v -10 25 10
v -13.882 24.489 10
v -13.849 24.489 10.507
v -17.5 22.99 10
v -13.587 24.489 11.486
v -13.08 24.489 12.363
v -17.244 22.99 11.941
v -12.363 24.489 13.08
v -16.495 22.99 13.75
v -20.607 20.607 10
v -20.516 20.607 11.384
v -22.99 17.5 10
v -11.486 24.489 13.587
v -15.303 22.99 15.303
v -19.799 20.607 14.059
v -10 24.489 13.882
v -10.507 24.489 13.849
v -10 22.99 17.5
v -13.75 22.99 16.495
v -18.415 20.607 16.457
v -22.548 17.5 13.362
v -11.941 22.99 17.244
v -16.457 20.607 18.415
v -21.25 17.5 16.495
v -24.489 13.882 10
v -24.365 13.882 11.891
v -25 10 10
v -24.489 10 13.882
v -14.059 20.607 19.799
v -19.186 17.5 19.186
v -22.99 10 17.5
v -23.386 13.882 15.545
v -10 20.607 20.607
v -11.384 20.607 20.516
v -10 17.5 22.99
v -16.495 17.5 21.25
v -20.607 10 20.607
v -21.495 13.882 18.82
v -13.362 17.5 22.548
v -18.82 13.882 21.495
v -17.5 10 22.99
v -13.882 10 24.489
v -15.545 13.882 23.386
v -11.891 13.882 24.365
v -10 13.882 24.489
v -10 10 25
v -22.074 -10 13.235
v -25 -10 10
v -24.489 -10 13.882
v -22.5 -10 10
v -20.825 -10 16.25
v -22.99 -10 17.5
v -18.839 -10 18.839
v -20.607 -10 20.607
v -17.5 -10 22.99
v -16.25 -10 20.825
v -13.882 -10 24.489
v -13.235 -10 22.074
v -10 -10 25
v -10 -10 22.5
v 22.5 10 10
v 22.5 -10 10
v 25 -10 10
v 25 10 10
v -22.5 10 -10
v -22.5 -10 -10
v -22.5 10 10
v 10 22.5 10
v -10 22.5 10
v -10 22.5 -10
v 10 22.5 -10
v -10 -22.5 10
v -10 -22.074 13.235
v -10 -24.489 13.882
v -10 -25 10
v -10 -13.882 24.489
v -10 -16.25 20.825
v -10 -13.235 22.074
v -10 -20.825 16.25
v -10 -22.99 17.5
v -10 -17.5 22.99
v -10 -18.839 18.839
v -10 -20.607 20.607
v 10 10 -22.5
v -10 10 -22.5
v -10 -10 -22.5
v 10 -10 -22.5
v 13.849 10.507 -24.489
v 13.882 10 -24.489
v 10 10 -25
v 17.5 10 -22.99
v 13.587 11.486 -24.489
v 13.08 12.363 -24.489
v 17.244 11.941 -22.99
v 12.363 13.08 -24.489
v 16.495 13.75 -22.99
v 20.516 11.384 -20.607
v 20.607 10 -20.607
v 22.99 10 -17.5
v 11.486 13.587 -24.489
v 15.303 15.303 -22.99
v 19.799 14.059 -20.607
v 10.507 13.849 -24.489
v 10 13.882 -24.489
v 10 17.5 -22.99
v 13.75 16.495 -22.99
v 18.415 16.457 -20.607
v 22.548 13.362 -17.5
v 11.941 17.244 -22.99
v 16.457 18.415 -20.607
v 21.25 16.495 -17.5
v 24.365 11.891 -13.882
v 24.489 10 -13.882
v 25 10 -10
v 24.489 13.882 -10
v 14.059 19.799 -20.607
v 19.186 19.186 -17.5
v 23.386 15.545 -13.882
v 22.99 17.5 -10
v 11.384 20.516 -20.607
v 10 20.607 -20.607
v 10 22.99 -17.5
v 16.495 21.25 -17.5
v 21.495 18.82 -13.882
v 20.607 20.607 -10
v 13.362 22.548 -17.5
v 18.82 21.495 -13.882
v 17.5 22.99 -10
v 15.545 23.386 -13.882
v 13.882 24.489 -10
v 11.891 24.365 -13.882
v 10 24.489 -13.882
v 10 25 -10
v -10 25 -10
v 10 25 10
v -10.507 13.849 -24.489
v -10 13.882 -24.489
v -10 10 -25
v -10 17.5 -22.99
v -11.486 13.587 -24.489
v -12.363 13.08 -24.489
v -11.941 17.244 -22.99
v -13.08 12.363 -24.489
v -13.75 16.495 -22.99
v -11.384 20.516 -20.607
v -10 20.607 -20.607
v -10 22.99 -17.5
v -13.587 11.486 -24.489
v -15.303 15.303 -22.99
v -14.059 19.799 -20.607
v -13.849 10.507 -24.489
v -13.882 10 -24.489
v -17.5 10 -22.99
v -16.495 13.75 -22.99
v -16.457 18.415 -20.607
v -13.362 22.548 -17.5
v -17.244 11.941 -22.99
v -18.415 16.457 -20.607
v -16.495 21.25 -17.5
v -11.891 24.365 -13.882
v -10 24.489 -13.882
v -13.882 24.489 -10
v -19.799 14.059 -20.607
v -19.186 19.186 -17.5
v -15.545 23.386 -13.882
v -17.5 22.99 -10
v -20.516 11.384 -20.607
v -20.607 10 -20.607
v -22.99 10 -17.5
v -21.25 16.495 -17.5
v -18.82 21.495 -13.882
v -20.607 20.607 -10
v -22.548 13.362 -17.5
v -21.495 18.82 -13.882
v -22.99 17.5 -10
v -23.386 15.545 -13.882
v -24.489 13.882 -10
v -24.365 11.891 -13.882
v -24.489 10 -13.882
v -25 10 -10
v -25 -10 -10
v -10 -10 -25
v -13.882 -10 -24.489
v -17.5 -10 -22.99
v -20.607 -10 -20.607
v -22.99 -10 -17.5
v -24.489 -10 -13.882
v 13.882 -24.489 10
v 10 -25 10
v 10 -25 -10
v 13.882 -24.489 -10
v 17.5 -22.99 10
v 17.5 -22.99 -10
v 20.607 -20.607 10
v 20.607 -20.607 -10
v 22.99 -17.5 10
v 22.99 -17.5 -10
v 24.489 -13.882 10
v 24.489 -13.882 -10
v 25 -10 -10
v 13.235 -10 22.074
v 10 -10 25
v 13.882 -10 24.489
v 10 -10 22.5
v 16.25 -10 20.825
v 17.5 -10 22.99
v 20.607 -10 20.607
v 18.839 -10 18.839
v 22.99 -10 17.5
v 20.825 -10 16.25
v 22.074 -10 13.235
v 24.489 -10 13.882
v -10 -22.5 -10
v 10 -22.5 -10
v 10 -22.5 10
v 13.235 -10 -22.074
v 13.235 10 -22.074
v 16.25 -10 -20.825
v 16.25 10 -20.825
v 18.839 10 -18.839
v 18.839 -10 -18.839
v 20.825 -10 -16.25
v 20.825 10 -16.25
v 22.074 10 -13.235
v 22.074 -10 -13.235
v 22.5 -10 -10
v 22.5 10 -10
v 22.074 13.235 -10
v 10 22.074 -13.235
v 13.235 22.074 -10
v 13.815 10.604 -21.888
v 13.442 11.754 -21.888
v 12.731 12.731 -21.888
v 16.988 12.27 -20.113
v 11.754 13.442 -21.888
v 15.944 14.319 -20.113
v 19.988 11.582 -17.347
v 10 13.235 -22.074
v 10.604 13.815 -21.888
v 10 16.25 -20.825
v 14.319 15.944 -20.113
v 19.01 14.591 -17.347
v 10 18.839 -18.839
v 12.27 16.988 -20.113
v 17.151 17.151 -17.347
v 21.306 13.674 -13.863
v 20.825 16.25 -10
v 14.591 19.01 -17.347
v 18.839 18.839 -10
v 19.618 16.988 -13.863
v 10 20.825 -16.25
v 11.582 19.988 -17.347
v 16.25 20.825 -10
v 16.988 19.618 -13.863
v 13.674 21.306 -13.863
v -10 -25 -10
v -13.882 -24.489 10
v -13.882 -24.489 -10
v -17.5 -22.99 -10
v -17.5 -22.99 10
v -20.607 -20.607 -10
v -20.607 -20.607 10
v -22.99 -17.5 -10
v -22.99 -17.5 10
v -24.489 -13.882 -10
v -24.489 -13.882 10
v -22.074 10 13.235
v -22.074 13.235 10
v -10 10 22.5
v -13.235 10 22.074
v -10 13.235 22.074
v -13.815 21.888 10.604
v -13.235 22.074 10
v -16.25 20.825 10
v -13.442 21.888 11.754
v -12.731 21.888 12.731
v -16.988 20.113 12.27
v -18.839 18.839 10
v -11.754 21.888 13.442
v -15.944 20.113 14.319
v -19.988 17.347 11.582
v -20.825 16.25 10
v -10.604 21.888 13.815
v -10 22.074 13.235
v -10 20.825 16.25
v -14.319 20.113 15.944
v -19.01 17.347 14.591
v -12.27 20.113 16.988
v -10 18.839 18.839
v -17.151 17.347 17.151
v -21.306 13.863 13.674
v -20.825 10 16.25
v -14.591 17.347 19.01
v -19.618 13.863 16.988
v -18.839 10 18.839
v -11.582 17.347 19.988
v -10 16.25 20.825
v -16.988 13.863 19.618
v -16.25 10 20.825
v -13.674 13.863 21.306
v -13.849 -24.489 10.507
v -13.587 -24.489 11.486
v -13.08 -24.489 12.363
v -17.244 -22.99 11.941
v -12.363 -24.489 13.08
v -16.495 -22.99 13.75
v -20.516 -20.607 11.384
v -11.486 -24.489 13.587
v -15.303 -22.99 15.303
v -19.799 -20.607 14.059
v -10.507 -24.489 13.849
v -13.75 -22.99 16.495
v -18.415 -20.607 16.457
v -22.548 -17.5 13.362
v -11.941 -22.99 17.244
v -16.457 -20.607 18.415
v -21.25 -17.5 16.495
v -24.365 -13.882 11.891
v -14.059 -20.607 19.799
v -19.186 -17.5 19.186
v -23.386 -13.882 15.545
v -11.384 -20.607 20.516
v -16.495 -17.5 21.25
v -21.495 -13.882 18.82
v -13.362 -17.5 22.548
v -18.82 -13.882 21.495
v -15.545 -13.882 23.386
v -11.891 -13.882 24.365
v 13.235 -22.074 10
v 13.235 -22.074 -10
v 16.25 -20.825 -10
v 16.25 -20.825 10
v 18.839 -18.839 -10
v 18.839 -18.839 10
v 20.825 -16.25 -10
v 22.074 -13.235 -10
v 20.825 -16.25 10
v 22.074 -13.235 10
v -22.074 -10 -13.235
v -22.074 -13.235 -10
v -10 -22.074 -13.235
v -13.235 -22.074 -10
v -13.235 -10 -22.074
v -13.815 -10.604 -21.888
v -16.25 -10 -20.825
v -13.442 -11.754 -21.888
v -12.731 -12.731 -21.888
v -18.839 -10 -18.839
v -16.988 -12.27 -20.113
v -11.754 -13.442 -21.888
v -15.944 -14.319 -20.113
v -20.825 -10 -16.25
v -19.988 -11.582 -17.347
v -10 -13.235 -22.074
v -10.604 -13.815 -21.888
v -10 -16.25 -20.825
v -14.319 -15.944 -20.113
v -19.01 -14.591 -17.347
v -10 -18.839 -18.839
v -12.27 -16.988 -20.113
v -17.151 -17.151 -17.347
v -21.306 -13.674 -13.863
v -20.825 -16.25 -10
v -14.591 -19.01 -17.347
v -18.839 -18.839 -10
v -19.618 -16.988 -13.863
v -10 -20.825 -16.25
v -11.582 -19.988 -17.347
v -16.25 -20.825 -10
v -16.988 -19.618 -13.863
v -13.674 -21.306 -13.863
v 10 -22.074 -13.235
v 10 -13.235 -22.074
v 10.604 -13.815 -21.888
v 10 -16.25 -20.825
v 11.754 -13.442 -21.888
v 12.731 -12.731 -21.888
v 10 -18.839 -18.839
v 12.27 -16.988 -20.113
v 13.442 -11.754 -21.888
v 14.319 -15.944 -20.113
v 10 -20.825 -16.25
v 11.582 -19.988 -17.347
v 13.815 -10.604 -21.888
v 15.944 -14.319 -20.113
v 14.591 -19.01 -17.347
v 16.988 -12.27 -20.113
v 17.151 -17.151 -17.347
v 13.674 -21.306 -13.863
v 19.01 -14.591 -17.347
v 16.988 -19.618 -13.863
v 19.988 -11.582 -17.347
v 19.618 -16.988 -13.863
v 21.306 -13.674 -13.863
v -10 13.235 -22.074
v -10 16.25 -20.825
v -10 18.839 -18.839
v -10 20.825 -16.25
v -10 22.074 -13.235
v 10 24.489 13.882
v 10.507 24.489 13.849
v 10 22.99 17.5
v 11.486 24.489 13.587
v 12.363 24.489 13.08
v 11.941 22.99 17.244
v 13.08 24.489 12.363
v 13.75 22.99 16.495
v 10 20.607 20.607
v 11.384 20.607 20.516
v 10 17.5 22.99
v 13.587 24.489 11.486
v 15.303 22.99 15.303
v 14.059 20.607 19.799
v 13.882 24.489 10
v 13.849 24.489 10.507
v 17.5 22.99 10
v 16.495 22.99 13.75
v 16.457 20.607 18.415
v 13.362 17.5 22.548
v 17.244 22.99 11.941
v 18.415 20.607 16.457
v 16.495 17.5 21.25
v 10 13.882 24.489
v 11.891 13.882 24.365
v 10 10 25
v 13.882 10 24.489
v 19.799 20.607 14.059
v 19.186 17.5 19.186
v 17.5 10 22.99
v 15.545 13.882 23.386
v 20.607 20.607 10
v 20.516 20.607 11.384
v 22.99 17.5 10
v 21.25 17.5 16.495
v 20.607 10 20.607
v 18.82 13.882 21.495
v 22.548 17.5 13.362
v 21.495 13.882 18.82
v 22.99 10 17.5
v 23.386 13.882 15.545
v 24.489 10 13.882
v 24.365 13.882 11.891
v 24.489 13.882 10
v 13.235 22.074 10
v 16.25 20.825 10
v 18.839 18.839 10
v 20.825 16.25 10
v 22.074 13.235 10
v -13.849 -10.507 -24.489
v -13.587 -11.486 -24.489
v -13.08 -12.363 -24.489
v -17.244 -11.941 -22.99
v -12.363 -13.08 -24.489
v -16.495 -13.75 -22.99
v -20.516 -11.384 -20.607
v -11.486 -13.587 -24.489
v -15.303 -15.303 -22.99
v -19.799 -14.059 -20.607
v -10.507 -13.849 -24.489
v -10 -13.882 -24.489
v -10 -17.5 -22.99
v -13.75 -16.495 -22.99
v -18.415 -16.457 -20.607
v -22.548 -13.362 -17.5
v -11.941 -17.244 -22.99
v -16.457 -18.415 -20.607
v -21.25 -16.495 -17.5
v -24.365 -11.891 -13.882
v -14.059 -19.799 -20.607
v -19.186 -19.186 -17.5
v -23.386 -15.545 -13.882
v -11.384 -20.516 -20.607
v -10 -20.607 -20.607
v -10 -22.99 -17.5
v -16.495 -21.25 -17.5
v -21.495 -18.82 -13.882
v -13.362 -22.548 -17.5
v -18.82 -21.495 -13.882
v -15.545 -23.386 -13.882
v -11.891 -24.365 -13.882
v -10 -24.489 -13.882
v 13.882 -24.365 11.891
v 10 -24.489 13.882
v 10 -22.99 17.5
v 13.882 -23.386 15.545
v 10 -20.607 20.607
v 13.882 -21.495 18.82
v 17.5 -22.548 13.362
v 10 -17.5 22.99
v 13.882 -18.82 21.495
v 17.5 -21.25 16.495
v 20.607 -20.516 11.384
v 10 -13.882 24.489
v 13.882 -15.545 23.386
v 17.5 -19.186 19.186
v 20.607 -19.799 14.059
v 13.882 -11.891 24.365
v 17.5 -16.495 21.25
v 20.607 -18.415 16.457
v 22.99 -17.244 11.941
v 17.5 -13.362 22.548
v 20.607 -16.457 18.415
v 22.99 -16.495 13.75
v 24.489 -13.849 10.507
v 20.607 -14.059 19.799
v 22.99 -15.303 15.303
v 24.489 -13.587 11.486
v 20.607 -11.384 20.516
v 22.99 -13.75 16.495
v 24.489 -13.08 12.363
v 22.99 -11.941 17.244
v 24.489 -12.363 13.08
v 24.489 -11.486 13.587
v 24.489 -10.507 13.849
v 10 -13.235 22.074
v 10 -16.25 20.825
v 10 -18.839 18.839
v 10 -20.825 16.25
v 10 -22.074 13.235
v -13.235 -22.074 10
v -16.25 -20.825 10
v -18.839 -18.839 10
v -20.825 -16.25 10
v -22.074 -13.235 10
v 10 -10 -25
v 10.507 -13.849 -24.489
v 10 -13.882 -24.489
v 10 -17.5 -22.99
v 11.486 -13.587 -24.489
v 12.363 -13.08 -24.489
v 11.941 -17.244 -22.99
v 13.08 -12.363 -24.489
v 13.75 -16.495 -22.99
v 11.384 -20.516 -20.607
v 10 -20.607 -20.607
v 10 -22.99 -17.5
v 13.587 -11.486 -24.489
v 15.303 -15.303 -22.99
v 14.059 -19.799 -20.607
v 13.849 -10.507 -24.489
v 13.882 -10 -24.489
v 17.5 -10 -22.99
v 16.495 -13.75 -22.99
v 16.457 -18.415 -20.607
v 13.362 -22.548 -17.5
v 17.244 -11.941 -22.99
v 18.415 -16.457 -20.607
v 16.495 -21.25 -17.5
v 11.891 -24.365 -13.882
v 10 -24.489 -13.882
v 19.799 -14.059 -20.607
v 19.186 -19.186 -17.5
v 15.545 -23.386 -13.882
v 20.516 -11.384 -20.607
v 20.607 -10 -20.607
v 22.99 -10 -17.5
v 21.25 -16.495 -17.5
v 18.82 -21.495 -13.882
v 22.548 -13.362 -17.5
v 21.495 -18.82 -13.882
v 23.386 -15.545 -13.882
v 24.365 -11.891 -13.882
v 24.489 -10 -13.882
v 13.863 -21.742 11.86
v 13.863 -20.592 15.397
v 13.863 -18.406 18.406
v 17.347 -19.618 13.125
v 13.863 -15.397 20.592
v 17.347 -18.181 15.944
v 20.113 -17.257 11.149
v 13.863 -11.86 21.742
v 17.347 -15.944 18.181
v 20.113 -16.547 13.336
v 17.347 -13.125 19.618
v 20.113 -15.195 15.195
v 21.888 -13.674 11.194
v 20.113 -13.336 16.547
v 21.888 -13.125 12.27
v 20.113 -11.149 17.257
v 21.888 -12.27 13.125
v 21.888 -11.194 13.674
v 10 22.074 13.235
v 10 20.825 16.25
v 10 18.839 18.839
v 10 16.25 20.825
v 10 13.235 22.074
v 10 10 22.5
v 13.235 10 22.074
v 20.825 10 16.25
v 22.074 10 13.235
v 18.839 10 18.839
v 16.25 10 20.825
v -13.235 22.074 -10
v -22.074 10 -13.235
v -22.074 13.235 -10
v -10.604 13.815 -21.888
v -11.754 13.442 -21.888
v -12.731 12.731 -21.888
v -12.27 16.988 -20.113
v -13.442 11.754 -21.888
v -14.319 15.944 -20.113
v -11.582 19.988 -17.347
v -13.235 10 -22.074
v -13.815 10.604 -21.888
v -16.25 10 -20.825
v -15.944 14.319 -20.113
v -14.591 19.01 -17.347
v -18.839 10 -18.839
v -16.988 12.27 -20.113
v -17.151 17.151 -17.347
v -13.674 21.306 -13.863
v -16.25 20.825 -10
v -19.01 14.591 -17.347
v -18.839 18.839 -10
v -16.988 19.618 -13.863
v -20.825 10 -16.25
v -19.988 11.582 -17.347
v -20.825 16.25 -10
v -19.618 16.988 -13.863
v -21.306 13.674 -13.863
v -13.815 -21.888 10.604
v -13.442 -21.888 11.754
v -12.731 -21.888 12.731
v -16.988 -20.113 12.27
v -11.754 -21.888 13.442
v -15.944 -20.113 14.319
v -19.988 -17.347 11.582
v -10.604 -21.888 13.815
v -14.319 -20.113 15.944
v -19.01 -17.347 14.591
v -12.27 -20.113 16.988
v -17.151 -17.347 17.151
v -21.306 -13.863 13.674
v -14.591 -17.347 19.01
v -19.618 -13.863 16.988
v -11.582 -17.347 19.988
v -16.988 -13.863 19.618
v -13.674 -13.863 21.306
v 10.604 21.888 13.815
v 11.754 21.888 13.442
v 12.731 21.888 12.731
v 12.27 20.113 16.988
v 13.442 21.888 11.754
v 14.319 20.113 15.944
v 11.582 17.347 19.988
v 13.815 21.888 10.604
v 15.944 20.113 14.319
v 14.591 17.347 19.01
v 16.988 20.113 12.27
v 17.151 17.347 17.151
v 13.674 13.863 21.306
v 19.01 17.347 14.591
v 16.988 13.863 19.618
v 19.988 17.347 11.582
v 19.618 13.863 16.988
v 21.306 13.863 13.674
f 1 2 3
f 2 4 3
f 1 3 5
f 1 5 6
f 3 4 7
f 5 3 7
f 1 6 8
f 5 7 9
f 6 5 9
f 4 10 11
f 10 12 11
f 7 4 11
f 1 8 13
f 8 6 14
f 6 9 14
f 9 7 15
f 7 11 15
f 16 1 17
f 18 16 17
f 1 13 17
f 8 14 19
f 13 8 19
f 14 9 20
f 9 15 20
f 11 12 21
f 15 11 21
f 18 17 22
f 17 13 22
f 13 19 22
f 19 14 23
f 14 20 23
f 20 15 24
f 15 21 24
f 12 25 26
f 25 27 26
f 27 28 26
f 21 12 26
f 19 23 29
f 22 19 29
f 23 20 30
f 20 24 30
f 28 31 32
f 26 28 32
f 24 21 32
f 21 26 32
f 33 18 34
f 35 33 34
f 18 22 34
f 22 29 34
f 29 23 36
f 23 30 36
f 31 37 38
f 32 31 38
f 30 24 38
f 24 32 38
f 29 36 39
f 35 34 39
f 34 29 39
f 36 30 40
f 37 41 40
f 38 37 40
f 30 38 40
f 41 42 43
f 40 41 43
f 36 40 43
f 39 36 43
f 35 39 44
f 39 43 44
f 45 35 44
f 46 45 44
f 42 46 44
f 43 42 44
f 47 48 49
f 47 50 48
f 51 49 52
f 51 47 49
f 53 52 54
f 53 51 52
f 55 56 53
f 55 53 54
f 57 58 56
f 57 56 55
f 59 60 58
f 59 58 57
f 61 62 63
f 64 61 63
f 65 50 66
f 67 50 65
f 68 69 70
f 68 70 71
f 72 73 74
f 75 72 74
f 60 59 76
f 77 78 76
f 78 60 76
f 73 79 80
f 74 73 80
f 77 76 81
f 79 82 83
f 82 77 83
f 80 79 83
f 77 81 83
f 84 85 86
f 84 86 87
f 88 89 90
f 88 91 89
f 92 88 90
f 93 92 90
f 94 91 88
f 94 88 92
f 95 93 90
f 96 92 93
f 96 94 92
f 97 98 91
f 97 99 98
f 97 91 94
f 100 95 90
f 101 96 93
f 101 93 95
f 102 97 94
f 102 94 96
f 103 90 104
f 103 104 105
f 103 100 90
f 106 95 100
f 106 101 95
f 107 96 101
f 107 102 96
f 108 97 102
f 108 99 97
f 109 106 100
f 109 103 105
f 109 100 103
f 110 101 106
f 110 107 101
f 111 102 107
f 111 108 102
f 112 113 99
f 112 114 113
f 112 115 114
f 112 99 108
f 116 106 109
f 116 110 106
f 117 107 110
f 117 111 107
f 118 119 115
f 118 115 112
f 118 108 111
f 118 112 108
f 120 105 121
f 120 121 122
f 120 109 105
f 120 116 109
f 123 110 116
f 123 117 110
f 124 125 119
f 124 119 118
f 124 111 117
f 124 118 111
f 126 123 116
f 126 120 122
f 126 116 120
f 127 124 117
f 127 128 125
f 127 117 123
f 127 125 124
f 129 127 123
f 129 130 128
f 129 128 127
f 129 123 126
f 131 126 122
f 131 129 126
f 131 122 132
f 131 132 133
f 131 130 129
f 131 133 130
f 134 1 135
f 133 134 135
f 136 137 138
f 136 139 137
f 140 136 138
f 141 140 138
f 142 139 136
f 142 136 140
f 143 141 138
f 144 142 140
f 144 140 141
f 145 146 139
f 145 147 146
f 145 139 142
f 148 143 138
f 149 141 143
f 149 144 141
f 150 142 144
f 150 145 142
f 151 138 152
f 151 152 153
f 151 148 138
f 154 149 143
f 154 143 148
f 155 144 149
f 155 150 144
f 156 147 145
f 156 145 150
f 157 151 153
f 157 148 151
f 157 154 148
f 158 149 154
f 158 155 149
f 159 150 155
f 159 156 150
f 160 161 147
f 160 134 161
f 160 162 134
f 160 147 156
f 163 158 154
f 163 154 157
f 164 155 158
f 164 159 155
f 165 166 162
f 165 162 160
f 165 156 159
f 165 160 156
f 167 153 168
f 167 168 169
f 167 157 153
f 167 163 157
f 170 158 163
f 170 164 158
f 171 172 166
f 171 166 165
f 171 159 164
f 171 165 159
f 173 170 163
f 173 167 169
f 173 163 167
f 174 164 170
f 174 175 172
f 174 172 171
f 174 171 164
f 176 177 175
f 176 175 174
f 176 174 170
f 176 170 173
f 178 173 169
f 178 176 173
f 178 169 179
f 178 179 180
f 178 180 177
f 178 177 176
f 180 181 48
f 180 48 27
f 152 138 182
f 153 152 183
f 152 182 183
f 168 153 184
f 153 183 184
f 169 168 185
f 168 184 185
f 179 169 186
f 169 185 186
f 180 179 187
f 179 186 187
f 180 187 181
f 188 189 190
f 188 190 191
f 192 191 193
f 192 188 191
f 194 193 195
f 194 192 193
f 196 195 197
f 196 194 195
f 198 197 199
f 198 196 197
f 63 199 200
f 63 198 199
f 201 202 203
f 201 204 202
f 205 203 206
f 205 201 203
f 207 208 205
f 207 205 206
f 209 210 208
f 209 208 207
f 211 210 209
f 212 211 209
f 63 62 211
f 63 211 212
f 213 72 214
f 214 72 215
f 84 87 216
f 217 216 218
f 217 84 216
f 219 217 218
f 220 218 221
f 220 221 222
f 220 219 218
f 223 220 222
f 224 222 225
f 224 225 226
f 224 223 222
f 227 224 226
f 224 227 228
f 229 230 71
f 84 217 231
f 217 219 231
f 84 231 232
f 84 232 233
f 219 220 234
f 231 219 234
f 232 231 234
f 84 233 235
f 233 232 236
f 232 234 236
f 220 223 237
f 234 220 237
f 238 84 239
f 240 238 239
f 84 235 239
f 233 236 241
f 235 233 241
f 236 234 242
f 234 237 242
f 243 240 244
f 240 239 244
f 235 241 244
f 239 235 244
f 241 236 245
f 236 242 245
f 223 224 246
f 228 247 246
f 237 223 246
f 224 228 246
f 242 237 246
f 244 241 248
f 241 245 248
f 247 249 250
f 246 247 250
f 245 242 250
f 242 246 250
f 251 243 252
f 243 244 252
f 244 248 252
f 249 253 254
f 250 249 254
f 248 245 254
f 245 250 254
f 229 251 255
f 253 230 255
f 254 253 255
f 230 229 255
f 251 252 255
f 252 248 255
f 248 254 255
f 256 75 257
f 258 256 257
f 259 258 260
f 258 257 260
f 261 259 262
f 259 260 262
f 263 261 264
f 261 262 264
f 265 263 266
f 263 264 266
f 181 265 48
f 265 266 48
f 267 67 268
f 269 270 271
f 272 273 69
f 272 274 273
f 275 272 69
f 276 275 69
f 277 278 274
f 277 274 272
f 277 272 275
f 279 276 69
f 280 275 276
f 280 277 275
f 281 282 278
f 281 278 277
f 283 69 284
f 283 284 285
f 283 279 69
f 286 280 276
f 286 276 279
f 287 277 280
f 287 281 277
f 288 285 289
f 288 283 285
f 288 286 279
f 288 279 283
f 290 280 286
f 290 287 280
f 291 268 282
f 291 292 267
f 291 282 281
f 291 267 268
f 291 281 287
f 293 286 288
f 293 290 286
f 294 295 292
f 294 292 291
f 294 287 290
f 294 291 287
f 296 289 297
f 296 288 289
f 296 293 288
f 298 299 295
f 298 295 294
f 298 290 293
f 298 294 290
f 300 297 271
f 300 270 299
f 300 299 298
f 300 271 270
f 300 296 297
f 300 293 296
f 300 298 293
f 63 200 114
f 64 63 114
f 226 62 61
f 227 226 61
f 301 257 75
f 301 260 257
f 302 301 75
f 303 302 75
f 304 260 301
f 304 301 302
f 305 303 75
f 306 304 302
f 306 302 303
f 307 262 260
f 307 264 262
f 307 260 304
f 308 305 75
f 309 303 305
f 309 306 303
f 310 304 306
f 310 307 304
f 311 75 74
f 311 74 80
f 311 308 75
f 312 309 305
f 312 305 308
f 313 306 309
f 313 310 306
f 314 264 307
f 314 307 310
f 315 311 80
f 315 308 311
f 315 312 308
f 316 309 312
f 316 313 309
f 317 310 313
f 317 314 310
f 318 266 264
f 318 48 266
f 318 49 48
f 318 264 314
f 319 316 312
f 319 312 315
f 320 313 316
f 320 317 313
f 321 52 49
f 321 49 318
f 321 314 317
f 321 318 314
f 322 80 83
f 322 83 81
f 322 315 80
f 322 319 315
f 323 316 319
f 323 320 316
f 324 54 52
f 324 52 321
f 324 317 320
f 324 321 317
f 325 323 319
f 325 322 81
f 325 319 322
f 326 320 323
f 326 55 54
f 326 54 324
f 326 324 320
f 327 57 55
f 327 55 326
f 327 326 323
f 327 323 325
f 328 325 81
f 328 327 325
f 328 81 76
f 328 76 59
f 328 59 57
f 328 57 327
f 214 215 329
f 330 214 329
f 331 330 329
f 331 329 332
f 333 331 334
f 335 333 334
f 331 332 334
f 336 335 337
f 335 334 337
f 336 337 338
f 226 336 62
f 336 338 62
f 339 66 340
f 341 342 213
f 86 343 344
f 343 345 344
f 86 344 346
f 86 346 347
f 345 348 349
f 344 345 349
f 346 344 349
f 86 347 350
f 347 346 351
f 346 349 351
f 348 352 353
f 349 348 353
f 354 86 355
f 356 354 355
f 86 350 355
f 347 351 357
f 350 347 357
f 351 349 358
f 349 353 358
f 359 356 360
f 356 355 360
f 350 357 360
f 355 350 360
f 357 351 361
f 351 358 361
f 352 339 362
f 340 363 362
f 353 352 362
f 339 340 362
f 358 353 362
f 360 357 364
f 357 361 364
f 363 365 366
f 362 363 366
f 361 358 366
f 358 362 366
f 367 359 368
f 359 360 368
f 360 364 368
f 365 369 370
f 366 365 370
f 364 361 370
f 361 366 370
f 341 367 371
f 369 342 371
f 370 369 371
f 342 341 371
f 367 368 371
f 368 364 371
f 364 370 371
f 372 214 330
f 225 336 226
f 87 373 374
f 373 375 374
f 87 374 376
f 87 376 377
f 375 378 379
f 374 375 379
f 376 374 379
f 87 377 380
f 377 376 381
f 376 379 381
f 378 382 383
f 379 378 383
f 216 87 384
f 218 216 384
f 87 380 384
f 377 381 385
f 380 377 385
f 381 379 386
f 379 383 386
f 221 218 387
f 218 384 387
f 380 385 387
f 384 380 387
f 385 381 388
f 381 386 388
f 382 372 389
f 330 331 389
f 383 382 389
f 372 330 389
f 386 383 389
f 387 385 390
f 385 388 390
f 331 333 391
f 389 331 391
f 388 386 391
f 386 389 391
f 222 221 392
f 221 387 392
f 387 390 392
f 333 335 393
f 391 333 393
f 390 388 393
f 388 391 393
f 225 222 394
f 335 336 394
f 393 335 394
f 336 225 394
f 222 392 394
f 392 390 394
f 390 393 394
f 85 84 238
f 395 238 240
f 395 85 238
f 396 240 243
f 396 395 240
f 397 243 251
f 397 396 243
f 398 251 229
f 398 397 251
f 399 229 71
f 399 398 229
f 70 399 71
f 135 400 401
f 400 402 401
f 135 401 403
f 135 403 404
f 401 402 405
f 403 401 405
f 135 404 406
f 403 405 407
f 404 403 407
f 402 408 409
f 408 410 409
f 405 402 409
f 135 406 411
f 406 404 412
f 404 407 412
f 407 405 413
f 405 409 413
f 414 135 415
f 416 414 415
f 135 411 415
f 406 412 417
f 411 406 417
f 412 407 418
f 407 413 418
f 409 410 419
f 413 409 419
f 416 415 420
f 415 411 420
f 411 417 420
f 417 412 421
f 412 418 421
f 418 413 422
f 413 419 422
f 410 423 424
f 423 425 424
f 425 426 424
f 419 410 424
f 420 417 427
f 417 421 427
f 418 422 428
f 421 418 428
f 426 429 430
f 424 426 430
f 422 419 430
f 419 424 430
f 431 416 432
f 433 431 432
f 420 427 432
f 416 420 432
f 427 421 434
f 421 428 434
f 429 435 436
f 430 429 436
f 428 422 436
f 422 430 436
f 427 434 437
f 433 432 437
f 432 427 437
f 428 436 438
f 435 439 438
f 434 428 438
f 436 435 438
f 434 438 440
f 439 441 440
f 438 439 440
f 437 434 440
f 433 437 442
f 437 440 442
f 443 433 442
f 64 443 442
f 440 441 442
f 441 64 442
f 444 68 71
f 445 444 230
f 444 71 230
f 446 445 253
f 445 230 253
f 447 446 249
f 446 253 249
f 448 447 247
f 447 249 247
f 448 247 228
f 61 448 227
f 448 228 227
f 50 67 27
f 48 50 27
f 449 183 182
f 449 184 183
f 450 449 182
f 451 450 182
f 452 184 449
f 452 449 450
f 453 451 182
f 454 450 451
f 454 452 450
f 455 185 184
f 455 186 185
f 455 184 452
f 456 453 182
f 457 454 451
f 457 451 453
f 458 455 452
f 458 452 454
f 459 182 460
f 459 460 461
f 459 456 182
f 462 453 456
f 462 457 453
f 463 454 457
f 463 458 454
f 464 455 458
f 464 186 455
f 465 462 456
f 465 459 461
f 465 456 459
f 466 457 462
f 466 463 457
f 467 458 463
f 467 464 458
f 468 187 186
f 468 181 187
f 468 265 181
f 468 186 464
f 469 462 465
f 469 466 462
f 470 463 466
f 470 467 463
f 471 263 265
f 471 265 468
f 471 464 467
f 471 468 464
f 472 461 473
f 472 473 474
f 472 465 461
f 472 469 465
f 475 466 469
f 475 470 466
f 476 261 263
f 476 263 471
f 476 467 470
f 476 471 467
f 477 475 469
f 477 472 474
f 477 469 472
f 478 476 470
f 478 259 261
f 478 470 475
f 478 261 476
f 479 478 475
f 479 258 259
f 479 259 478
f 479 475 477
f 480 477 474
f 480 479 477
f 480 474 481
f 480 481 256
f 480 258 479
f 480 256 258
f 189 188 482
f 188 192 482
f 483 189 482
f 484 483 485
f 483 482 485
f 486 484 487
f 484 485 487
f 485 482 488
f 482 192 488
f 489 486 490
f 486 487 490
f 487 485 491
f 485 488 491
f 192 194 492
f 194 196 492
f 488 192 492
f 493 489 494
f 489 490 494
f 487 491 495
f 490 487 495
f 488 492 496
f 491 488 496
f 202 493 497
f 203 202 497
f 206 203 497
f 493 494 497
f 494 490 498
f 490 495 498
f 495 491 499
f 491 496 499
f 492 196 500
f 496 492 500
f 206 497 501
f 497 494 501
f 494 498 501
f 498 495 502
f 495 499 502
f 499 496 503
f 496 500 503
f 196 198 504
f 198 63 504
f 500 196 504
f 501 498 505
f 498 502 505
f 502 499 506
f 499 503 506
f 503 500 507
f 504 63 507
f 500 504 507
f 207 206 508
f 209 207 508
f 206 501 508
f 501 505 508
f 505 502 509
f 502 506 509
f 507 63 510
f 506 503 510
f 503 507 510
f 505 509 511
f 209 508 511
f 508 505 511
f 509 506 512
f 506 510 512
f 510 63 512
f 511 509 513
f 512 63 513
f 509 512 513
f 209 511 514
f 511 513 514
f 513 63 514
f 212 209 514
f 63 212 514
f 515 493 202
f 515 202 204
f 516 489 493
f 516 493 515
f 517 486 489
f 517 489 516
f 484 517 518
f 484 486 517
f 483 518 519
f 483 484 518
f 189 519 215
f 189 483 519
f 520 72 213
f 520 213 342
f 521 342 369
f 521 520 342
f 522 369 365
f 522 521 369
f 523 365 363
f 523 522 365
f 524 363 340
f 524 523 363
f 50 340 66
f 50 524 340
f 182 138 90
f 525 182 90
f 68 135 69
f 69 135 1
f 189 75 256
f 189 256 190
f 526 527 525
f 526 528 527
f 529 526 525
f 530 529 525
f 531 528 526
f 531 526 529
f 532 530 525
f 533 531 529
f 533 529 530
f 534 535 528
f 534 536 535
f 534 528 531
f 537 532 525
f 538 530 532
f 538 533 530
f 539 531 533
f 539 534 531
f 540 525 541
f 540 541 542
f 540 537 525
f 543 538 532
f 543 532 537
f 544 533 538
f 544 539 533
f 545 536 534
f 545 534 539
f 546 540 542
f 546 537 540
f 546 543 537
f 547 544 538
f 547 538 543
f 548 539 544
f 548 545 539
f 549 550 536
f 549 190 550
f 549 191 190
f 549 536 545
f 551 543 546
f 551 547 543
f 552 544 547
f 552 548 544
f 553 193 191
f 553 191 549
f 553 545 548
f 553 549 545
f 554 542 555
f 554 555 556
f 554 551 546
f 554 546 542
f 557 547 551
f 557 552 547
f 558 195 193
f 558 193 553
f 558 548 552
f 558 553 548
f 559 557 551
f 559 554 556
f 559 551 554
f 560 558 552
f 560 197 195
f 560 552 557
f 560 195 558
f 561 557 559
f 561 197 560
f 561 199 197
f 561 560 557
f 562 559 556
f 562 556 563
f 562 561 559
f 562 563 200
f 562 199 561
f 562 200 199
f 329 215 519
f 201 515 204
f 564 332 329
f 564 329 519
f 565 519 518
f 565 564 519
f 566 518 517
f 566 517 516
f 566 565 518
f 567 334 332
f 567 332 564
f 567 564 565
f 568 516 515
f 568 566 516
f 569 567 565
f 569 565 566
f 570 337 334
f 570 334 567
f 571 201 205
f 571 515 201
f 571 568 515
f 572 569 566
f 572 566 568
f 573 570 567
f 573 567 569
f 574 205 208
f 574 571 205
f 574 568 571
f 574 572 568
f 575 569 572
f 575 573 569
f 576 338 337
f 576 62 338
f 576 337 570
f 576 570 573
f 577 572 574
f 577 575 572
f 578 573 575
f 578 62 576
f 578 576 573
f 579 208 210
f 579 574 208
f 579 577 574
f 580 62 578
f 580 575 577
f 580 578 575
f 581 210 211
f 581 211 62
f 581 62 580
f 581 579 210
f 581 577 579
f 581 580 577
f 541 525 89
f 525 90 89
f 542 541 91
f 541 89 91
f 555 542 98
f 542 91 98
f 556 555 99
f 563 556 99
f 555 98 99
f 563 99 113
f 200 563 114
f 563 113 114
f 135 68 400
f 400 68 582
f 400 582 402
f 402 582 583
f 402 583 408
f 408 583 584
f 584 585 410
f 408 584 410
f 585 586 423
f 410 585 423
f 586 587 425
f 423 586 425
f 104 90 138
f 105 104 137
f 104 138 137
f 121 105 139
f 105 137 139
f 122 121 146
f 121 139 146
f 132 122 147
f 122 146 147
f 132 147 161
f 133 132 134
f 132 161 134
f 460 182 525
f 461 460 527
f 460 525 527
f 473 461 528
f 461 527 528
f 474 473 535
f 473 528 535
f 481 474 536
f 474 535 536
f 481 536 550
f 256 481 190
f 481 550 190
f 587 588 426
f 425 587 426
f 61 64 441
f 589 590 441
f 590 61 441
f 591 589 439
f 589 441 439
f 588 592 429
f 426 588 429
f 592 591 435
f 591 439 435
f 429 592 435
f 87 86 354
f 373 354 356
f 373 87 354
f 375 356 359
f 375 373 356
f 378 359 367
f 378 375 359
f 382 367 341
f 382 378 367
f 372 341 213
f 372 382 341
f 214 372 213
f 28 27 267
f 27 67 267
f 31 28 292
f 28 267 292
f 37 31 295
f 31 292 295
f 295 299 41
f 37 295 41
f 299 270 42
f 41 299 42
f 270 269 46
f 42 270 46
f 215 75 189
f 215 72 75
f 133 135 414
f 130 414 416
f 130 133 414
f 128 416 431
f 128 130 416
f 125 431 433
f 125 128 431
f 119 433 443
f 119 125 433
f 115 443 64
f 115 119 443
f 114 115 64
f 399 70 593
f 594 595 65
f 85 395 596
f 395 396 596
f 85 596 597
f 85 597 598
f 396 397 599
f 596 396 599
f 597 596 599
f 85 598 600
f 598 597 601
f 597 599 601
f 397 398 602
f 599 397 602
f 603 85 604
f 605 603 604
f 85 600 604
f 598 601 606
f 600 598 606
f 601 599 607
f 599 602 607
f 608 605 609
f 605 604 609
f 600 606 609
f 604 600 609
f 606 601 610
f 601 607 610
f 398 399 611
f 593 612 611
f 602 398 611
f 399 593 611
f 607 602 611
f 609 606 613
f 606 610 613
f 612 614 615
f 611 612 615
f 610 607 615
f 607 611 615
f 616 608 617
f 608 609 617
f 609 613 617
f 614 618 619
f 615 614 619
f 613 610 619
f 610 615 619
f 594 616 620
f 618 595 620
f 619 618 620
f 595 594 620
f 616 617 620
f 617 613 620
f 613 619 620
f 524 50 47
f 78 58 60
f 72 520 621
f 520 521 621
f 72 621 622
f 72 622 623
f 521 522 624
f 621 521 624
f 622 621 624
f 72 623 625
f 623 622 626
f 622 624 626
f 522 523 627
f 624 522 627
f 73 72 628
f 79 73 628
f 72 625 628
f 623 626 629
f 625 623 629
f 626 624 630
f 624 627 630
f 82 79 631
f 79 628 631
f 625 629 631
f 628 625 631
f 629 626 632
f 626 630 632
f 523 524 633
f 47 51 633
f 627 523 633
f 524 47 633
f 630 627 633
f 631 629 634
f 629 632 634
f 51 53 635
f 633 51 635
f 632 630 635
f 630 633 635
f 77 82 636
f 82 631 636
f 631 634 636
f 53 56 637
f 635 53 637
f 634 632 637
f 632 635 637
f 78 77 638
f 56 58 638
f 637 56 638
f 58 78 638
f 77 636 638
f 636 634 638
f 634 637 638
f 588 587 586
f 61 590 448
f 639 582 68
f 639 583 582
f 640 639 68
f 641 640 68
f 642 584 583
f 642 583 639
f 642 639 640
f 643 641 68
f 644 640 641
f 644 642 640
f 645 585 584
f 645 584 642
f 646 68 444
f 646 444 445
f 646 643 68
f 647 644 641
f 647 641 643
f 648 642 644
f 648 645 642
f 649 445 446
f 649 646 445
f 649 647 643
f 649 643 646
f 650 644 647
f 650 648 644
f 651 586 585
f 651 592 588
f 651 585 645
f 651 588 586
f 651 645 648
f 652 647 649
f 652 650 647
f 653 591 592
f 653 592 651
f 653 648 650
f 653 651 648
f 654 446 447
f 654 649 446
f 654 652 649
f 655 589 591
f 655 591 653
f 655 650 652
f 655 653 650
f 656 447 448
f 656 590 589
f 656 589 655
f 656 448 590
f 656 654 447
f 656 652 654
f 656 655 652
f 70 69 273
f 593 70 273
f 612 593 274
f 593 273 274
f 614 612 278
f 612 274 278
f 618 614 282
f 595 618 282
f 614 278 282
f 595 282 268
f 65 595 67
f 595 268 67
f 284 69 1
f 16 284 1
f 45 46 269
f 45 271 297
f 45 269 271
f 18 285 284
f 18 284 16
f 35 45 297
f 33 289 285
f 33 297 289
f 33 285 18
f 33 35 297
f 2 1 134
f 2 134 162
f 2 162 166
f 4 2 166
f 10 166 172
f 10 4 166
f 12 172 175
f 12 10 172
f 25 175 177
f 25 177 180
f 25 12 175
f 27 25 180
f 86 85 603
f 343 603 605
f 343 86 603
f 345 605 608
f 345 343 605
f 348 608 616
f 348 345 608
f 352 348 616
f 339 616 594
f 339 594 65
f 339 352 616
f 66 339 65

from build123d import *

# Parameters (mm, degrees)
F0_W     = 50
F0_H     = 50
F1_DEPTH = 25
F2_R     = 15
F3_R     = 15
F4_R     = 15
F5_R     = 15
F6_R     = 15
F7_T     = 2.5


# Not quite as in the source:
# - a shell that OpenCascade refuses in one call is made with other operations: the cavity is built on its own and cut out


with BuildPart() as f1:
    # F0 (on Top) → F1 (new body, symmetric)
    with BuildSketch(Plane.XY):
        Rectangle(F0_W, F0_H)
    extrude(amount=F1_DEPTH, both=True)

    # F2
    f2_edges = [f1.edges().sort_by_distance(p)[0] for p in [
        (-25, 0, 25),
    ]]
    fillet(f2_edges, radius=F2_R)

    # F3
    f3_edges = [f1.edges().sort_by_distance(p)[0] for p in [
        (7.5, -25, 25),
    ]]
    fillet(f3_edges, radius=F3_R)

    # F4
    f4_edges = [f1.edges().sort_by_distance(p)[0] for p in [
        (25, 7.5, 25),
    ]]
    fillet(f4_edges, radius=F4_R)

    # F5
    f5_edges = [f1.edges().sort_by_distance(p)[0] for p in [
        (0, 25, 25),
    ]]
    fillet(f5_edges, radius=F5_R)

    # F6
    f6_edges = [f1.edges().sort_by_distance(p)[0] for p in [
        (25, 0, -25),
    ]]
    fillet(f6_edges, radius=F6_R)

    # F7: shell of thickness 2.5, made by hand


with BuildPart() as f7_core1:
    # F7_t2: copy of F1
    add(f1.part)

    # the walls: a layer under each face that stays
    f7_faces = [f7_core1.faces().sort_by_distance(p)[0] for p in [
        (0, 0, -25),
        (20.6066017178, 0, -20.6066017178),
        (0, -20.6066017178, -20.6066017178),
        (0, 20.6066017178, -20.6066017178),
        (-20.6066017178, 0, -20.6066017178),
        (17.5, -17.5, -20.6066017178),
        (25, 0, 0),
        (17.5, 17.5, -20.6066017178),
        (-17.5, -17.5, -20.6066017178),
        (0, -25, 0),
        (0, 25, 0),
        (-17.5, 17.5, -20.6066017178),
        (-25, 0, 0),
        (20.6066017178, -20.6066017178, 0),
        (20.6066017178, 20.6066017178, 0),
        (-20.6066017178, -20.6066017178, 0),
        (-20.6066017178, 20.6066017178, 0),
        (20.6066017178, -17.5, 17.5),
        (17.5, 20.6066017178, 17.5),
        (-17.5, -20.6066017178, 17.5),
        (-17.5, 20.6066017178, 17.5),
    ]]
    thicken(f7_faces, amount=-F7_T, mode=Mode.SUBTRACT)


with BuildPart() as f1_1:
    add(f1.part)

    # what is left inside the walls is the cavity
    f7_cavity = [f7_core1.part.solids().sort_by_distance(p)[0] for p in [
        (3.333333, 20.588924, 20.588924),
    ]]
    add(f7_cavity, mode=Mode.SUBTRACT)


solid = f1_1.part
